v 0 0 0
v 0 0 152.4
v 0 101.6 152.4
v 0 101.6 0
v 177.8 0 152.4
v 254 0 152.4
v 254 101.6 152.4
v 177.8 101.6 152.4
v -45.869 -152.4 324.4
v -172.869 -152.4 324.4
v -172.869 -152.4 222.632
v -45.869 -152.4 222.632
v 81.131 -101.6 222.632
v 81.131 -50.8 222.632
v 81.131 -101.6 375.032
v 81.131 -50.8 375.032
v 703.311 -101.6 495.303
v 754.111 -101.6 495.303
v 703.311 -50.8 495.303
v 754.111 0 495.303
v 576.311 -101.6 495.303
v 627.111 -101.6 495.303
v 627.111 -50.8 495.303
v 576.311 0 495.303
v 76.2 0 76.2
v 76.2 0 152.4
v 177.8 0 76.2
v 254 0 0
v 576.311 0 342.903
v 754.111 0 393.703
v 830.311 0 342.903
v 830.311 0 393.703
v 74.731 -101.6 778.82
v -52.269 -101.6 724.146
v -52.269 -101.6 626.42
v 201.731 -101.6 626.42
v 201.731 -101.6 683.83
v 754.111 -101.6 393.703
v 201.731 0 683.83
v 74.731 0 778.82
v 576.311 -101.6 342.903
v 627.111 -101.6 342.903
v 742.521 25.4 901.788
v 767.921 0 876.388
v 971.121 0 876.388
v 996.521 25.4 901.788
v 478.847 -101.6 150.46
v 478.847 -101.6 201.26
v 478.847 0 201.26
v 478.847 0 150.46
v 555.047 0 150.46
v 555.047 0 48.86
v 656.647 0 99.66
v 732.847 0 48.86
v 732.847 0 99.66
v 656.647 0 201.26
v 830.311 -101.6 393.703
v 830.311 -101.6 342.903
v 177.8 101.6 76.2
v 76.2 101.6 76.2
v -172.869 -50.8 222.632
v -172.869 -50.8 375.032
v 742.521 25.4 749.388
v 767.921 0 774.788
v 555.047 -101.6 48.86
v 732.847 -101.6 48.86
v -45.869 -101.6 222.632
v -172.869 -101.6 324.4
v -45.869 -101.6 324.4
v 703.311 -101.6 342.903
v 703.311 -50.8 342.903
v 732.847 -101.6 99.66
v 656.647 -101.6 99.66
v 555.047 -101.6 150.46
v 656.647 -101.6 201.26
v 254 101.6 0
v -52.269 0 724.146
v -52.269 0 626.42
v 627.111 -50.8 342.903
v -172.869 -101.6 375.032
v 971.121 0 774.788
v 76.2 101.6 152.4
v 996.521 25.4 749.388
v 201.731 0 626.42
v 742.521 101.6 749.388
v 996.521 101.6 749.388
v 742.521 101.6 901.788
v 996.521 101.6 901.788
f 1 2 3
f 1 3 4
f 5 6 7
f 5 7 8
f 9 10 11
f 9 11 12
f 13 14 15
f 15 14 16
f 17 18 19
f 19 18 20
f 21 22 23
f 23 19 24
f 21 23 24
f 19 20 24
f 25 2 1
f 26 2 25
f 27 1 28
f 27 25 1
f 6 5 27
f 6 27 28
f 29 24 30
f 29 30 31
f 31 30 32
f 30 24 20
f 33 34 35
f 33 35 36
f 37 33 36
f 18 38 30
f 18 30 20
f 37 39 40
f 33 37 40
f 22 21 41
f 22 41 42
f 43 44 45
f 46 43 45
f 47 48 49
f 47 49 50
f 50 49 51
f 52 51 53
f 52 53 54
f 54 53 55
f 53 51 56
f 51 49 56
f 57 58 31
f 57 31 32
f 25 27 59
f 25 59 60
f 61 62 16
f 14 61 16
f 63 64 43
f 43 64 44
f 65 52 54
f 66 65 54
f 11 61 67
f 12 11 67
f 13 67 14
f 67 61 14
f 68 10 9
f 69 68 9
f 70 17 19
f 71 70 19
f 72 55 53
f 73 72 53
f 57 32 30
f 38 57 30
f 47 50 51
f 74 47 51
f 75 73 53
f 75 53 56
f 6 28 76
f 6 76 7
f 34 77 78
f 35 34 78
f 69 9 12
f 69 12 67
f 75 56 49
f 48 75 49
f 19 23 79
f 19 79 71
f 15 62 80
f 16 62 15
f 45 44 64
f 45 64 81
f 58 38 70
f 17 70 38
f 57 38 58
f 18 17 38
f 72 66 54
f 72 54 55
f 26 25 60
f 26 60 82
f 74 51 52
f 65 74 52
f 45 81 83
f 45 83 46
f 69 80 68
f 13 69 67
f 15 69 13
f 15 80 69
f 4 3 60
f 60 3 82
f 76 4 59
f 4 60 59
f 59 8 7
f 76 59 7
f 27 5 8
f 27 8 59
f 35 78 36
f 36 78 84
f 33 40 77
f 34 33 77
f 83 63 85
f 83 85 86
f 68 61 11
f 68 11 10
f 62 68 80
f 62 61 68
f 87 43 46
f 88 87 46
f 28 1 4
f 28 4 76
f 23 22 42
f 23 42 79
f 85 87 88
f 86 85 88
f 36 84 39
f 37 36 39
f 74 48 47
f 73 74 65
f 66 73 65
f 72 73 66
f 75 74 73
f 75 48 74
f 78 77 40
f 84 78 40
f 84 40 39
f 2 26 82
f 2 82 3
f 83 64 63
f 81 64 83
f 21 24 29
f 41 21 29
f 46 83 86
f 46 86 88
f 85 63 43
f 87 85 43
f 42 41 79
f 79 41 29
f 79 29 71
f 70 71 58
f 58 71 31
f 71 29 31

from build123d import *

# Parameters (mm, degrees)
F1_DEPTH  = 101.6
F2_W      = 254
F2_H      = 152.4
F3_DEPTH  = 152.4
F4_W      = 127
F4_H      = 50.8
F5_DEPTH  = 152.4
F6_W      = 127
F6_H      = 50.632129
F7_DEPTH  = 50.8
F8_DEPTH  = 50.8
F10_DEPTH = 101.6
F11_W     = 76.2
F11_H     = 50.8
F12_DEPTH = 152.4
F14_DEPTH = 101.6
F16_DEPTH = 101.6
F17_W     = 254
F17_H     = 152.4
F18_DEPTH = 101.6
F19_SIZE  = 25.4


with BuildPart() as f1:
    # F0 (on Front) → F1 (new body)
    with BuildSketch(Plane.XZ):
        Polygon((0, 152.4), (0, 0), (254, 0), (254, 152.4), (177.8, 152.4), (177.8, 76.2), (76.2, 76.2), (76.2, 125.114418), (76.2, 132.488902), (76.2, 152.4), align=None)
    extrude(amount=-F1_DEPTH)


with BuildPart() as f3:
    # F2 (on Front) → F3 (new body)
    with BuildSketch(Plane.XZ):
        with Locations((-45.868672, 298.832494)):
            Rectangle(F2_W, F2_H)
    extrude(amount=F3_DEPTH)

    # F4 (on face) → F5 (cut)
    with BuildSketch(Plane.XY.offset(375.032494)):
        with Locations((17.631328, -127)):
            Rectangle(F4_W, F4_H)
    extrude(amount=-F5_DEPTH, mode=Mode.SUBTRACT)

    # F6 (on face) → F7 (cut)
    with BuildSketch(Plane.XZ.offset(152.4)):
        with Locations((-109.368672, 349.71643)):
            Rectangle(F6_W, F6_H)
    extrude(amount=-F7_DEPTH, mode=Mode.SUBTRACT)

    # F2 (on Front) → F8 (cut)
    with BuildSketch(Plane.XZ):
        with Locations((-45.868672, 298.832494)):
            Rectangle(F2_W, F2_H)
    extrude(amount=F8_DEPTH, mode=Mode.SUBTRACT)


with BuildPart() as f10:
    # F9 (on Front) → F10 (new body)
    with BuildSketch(Plane.XZ):
        Polygon((576.311184, 495.302642), (576.311184, 342.902642), (830.311184, 342.902642), (830.311184, 393.702642), (754.111184, 393.702642), (754.111184, 495.302642), align=None)
    extrude(amount=F10_DEPTH)

    # F11 (on face) → F12 (cut)
    with BuildSketch(Plane.XY.offset(495.302642)):
        with Locations((665.211184, -76.2)):
            Rectangle(F11_W, F11_H)
    extrude(amount=-F12_DEPTH, mode=Mode.SUBTRACT)


with BuildPart() as f14:
    # F13 (on Front) → F14 (new body)
    with BuildSketch(Plane.XZ):
        Polygon((555.046569, 150.460462), (555.046569, 48.860462), (732.846569, 48.860462), (732.846569, 99.660462), (656.646569, 99.660462), (656.646569, 201.260462), (478.846569, 201.260462), (478.846569, 150.460462), align=None)
    extrude(amount=F14_DEPTH)


with BuildPart() as f16:
    # F15 (on Front) → F16 (new body)
    with BuildSketch(Plane.XZ):
        Polygon((201.730754, 683.829725), (74.730754, 778.819865), (-52.269246, 724.146187), (-52.269246, 626.419865), (201.730754, 626.419865), align=None)
    extrude(amount=F16_DEPTH)


with BuildPart() as f18:
    # F17 (on Front) → F18 (new body)
    with BuildSketch(Plane.XZ):
        with Locations((869.520843, 825.588486)):
            Rectangle(F17_W, F17_H)
    extrude(amount=-F18_DEPTH)

    # F19
    f19_edges = [f18.edges().sort_by_distance(p)[0] for p in [
        (869.520843, 0, 901.788486),
        (742.520843, 0, 825.588486),
        (869.520843, 0, 749.388486),
        (996.520843, 0, 825.588486),
    ]]
    chamfer(f19_edges, length=F19_SIZE)


solid = Compound([f1.part, f3.part, f10.part, f14.part, f16.part, f18.part])
